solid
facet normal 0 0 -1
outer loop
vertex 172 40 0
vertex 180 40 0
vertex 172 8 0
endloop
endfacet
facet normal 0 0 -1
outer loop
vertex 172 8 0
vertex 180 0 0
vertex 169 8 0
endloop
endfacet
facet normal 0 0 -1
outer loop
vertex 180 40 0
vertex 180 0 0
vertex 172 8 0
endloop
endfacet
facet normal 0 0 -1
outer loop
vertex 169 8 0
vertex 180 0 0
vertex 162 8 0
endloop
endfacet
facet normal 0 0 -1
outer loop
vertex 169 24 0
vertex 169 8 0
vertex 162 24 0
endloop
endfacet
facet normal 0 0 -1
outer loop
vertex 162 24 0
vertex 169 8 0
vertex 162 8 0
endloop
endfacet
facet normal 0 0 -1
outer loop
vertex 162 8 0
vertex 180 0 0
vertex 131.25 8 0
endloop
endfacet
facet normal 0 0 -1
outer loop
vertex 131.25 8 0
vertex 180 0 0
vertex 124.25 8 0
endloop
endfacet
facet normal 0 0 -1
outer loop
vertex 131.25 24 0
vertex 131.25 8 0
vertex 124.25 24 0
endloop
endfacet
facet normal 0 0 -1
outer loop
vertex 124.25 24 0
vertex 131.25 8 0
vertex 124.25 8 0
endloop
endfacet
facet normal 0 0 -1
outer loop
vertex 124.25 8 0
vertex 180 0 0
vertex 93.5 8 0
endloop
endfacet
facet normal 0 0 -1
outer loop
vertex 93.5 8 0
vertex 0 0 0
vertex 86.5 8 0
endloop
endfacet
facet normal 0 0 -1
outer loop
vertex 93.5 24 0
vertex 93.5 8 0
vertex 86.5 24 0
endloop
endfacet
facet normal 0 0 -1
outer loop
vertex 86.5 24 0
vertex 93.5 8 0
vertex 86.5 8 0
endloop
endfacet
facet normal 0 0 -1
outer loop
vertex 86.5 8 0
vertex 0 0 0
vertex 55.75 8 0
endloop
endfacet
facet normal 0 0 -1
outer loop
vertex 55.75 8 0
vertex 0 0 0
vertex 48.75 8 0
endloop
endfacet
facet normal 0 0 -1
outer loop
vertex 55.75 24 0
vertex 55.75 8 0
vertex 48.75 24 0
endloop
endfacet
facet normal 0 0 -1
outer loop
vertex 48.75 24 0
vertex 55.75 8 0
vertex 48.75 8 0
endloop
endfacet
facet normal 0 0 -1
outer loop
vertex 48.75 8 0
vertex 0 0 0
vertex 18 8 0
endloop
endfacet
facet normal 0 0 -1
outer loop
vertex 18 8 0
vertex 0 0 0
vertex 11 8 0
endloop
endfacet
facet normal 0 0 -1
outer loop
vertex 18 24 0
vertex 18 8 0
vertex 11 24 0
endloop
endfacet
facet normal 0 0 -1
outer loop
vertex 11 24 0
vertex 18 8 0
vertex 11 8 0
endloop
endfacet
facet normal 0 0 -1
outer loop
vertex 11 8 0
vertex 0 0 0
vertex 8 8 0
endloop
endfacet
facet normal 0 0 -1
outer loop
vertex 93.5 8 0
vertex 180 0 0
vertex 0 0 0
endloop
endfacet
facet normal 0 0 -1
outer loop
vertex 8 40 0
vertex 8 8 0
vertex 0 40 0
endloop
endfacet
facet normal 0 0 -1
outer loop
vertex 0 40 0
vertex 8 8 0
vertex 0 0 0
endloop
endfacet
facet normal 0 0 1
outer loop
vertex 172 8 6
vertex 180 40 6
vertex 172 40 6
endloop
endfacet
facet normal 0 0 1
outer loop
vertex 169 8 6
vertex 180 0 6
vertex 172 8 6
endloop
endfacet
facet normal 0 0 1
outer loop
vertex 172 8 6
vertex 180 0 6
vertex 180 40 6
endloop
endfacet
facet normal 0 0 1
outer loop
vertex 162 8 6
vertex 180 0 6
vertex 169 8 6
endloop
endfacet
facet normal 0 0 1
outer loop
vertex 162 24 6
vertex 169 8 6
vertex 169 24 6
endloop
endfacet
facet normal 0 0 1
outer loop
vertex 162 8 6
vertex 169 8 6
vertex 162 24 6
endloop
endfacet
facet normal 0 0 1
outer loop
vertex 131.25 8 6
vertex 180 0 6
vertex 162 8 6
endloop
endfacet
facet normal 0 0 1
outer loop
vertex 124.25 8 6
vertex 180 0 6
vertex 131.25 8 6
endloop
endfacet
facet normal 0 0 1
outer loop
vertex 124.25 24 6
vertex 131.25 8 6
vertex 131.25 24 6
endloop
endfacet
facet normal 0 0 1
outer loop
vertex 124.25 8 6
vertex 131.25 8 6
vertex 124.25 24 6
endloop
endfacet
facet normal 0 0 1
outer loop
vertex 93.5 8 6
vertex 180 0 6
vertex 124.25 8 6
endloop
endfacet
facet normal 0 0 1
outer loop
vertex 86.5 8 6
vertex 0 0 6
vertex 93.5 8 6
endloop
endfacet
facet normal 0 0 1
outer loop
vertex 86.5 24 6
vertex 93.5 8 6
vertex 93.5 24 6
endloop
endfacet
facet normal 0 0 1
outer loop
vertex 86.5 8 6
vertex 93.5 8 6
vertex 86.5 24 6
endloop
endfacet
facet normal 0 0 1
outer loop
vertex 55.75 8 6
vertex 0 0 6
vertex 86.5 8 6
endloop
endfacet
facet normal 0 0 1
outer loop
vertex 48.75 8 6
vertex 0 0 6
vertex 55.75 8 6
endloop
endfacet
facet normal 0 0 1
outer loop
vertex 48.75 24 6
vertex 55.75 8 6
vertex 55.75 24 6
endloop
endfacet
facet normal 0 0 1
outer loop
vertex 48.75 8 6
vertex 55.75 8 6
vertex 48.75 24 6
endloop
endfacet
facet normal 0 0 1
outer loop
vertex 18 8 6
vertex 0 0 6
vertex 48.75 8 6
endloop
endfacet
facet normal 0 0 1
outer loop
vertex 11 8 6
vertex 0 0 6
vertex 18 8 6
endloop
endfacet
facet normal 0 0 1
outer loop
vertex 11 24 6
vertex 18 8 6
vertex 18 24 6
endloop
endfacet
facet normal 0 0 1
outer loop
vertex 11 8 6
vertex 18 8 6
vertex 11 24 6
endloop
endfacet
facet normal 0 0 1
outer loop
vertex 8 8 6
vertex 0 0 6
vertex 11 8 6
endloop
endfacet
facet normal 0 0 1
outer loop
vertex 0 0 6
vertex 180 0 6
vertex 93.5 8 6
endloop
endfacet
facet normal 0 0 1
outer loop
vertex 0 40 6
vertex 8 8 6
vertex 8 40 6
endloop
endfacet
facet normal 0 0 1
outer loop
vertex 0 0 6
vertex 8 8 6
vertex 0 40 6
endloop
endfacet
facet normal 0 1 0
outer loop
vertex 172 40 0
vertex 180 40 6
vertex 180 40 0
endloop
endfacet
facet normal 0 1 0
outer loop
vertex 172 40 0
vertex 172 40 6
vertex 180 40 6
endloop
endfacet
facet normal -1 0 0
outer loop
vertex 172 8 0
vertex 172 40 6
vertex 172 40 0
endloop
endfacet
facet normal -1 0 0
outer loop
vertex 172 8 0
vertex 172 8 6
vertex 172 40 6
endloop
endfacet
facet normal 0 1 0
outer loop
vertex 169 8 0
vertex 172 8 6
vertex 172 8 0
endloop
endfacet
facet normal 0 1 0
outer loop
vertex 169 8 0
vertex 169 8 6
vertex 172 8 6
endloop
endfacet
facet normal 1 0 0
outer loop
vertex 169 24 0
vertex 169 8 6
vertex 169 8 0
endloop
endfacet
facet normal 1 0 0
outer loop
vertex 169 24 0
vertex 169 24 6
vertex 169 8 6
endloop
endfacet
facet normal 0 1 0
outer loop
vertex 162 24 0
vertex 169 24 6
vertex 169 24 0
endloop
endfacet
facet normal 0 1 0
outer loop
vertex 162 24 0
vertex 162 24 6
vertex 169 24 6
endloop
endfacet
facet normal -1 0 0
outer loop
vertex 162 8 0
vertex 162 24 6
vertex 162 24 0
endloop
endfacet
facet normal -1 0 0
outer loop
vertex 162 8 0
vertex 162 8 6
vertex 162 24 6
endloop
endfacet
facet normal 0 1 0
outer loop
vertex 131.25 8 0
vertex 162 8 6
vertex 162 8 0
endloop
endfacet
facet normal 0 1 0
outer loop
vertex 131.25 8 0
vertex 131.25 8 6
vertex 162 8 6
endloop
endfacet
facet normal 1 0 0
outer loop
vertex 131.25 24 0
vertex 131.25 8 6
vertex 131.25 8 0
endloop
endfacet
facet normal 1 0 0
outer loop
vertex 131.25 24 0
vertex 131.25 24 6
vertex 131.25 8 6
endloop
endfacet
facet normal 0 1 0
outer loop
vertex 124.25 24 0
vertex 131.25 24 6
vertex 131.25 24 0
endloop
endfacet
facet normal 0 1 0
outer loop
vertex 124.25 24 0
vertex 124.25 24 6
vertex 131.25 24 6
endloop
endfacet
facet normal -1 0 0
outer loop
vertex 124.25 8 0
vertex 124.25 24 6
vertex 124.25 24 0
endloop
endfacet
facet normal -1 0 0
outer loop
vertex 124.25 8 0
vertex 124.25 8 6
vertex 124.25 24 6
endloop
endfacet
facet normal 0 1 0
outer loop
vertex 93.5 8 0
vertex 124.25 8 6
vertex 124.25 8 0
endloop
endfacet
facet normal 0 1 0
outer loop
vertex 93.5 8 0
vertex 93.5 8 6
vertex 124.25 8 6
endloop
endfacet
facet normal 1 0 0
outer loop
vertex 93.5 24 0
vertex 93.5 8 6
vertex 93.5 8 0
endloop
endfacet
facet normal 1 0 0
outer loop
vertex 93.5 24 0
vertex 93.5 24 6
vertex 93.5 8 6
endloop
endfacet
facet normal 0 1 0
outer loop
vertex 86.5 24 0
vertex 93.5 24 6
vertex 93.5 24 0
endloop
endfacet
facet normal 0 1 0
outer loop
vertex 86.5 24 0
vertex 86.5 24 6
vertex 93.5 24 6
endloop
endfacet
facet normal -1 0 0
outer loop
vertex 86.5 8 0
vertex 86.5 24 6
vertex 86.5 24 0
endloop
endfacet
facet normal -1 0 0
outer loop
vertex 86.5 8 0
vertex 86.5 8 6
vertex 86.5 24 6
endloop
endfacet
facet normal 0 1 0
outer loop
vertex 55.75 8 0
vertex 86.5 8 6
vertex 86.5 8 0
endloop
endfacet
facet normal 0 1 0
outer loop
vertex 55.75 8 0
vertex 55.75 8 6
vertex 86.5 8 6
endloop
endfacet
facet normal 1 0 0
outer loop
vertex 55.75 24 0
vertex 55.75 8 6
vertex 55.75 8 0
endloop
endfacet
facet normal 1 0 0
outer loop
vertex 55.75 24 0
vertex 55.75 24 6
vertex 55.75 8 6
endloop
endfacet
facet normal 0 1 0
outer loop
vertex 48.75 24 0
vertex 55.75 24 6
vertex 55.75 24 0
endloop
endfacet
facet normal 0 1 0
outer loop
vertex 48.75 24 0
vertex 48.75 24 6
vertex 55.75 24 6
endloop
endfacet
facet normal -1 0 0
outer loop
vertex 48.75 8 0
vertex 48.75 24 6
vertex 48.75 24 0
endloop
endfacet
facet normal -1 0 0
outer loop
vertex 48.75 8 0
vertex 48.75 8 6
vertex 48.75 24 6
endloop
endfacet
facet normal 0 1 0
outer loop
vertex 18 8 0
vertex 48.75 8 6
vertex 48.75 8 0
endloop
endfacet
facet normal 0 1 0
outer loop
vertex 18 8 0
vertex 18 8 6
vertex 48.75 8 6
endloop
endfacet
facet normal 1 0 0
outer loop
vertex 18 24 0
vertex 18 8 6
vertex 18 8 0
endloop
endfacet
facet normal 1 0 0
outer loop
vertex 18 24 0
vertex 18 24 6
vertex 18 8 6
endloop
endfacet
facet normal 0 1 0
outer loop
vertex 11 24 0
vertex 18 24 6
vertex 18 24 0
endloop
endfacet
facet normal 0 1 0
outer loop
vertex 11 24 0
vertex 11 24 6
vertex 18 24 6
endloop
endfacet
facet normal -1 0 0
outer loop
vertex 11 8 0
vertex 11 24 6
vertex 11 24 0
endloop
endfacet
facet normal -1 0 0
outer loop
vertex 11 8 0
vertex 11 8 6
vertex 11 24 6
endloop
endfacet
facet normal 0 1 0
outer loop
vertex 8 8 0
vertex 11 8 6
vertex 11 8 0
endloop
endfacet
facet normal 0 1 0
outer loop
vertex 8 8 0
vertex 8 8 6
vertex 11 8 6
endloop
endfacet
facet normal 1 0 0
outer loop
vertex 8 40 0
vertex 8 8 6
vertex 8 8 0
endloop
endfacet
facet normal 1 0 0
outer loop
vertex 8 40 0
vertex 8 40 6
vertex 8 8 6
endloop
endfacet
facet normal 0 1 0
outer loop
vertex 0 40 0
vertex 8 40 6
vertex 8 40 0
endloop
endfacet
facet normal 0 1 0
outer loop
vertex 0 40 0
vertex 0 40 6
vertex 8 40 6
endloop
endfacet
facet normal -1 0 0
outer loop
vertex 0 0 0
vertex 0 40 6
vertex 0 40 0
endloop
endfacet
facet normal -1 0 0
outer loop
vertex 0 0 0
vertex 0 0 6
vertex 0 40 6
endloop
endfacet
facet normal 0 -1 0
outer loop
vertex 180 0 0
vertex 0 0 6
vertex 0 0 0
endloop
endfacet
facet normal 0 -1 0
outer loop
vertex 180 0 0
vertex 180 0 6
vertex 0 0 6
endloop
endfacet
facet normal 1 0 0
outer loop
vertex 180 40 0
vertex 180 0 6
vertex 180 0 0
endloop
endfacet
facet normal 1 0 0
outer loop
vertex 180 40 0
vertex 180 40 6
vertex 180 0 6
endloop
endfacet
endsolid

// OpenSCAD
$fn = 32;

// ----------------------------------------------------------------------
// Guard grille: 5 slats over a 180 x 40 mm plate
// ----------------------------------------------------------------------

// --- parameters (mm) ---
profile_height = 6;       // extrusion height
profile_points = 28;      // points of the closed outline

profile = [[0, 0], [180, 0], [180, 40], [172, 40], [172, 8], [169, 8], [169, 24], [162, 24], [162, 8], [131.25, 8], [131.25, 24], [124.25, 24], [124.25, 8], [93.5, 8], [93.5, 24], [86.5, 24], [86.5, 8], [55.75, 8], [55.75, 24], [48.75, 24], [48.75, 8], [18, 8], [18, 24], [11, 24], [11, 8], [8, 8], [8, 40], [0, 40]];  // single closed polygon, 28 points, counter clockwise

// --- the one profile operation ---
linear_extrude(height = profile_height) polygon(points = profile);
